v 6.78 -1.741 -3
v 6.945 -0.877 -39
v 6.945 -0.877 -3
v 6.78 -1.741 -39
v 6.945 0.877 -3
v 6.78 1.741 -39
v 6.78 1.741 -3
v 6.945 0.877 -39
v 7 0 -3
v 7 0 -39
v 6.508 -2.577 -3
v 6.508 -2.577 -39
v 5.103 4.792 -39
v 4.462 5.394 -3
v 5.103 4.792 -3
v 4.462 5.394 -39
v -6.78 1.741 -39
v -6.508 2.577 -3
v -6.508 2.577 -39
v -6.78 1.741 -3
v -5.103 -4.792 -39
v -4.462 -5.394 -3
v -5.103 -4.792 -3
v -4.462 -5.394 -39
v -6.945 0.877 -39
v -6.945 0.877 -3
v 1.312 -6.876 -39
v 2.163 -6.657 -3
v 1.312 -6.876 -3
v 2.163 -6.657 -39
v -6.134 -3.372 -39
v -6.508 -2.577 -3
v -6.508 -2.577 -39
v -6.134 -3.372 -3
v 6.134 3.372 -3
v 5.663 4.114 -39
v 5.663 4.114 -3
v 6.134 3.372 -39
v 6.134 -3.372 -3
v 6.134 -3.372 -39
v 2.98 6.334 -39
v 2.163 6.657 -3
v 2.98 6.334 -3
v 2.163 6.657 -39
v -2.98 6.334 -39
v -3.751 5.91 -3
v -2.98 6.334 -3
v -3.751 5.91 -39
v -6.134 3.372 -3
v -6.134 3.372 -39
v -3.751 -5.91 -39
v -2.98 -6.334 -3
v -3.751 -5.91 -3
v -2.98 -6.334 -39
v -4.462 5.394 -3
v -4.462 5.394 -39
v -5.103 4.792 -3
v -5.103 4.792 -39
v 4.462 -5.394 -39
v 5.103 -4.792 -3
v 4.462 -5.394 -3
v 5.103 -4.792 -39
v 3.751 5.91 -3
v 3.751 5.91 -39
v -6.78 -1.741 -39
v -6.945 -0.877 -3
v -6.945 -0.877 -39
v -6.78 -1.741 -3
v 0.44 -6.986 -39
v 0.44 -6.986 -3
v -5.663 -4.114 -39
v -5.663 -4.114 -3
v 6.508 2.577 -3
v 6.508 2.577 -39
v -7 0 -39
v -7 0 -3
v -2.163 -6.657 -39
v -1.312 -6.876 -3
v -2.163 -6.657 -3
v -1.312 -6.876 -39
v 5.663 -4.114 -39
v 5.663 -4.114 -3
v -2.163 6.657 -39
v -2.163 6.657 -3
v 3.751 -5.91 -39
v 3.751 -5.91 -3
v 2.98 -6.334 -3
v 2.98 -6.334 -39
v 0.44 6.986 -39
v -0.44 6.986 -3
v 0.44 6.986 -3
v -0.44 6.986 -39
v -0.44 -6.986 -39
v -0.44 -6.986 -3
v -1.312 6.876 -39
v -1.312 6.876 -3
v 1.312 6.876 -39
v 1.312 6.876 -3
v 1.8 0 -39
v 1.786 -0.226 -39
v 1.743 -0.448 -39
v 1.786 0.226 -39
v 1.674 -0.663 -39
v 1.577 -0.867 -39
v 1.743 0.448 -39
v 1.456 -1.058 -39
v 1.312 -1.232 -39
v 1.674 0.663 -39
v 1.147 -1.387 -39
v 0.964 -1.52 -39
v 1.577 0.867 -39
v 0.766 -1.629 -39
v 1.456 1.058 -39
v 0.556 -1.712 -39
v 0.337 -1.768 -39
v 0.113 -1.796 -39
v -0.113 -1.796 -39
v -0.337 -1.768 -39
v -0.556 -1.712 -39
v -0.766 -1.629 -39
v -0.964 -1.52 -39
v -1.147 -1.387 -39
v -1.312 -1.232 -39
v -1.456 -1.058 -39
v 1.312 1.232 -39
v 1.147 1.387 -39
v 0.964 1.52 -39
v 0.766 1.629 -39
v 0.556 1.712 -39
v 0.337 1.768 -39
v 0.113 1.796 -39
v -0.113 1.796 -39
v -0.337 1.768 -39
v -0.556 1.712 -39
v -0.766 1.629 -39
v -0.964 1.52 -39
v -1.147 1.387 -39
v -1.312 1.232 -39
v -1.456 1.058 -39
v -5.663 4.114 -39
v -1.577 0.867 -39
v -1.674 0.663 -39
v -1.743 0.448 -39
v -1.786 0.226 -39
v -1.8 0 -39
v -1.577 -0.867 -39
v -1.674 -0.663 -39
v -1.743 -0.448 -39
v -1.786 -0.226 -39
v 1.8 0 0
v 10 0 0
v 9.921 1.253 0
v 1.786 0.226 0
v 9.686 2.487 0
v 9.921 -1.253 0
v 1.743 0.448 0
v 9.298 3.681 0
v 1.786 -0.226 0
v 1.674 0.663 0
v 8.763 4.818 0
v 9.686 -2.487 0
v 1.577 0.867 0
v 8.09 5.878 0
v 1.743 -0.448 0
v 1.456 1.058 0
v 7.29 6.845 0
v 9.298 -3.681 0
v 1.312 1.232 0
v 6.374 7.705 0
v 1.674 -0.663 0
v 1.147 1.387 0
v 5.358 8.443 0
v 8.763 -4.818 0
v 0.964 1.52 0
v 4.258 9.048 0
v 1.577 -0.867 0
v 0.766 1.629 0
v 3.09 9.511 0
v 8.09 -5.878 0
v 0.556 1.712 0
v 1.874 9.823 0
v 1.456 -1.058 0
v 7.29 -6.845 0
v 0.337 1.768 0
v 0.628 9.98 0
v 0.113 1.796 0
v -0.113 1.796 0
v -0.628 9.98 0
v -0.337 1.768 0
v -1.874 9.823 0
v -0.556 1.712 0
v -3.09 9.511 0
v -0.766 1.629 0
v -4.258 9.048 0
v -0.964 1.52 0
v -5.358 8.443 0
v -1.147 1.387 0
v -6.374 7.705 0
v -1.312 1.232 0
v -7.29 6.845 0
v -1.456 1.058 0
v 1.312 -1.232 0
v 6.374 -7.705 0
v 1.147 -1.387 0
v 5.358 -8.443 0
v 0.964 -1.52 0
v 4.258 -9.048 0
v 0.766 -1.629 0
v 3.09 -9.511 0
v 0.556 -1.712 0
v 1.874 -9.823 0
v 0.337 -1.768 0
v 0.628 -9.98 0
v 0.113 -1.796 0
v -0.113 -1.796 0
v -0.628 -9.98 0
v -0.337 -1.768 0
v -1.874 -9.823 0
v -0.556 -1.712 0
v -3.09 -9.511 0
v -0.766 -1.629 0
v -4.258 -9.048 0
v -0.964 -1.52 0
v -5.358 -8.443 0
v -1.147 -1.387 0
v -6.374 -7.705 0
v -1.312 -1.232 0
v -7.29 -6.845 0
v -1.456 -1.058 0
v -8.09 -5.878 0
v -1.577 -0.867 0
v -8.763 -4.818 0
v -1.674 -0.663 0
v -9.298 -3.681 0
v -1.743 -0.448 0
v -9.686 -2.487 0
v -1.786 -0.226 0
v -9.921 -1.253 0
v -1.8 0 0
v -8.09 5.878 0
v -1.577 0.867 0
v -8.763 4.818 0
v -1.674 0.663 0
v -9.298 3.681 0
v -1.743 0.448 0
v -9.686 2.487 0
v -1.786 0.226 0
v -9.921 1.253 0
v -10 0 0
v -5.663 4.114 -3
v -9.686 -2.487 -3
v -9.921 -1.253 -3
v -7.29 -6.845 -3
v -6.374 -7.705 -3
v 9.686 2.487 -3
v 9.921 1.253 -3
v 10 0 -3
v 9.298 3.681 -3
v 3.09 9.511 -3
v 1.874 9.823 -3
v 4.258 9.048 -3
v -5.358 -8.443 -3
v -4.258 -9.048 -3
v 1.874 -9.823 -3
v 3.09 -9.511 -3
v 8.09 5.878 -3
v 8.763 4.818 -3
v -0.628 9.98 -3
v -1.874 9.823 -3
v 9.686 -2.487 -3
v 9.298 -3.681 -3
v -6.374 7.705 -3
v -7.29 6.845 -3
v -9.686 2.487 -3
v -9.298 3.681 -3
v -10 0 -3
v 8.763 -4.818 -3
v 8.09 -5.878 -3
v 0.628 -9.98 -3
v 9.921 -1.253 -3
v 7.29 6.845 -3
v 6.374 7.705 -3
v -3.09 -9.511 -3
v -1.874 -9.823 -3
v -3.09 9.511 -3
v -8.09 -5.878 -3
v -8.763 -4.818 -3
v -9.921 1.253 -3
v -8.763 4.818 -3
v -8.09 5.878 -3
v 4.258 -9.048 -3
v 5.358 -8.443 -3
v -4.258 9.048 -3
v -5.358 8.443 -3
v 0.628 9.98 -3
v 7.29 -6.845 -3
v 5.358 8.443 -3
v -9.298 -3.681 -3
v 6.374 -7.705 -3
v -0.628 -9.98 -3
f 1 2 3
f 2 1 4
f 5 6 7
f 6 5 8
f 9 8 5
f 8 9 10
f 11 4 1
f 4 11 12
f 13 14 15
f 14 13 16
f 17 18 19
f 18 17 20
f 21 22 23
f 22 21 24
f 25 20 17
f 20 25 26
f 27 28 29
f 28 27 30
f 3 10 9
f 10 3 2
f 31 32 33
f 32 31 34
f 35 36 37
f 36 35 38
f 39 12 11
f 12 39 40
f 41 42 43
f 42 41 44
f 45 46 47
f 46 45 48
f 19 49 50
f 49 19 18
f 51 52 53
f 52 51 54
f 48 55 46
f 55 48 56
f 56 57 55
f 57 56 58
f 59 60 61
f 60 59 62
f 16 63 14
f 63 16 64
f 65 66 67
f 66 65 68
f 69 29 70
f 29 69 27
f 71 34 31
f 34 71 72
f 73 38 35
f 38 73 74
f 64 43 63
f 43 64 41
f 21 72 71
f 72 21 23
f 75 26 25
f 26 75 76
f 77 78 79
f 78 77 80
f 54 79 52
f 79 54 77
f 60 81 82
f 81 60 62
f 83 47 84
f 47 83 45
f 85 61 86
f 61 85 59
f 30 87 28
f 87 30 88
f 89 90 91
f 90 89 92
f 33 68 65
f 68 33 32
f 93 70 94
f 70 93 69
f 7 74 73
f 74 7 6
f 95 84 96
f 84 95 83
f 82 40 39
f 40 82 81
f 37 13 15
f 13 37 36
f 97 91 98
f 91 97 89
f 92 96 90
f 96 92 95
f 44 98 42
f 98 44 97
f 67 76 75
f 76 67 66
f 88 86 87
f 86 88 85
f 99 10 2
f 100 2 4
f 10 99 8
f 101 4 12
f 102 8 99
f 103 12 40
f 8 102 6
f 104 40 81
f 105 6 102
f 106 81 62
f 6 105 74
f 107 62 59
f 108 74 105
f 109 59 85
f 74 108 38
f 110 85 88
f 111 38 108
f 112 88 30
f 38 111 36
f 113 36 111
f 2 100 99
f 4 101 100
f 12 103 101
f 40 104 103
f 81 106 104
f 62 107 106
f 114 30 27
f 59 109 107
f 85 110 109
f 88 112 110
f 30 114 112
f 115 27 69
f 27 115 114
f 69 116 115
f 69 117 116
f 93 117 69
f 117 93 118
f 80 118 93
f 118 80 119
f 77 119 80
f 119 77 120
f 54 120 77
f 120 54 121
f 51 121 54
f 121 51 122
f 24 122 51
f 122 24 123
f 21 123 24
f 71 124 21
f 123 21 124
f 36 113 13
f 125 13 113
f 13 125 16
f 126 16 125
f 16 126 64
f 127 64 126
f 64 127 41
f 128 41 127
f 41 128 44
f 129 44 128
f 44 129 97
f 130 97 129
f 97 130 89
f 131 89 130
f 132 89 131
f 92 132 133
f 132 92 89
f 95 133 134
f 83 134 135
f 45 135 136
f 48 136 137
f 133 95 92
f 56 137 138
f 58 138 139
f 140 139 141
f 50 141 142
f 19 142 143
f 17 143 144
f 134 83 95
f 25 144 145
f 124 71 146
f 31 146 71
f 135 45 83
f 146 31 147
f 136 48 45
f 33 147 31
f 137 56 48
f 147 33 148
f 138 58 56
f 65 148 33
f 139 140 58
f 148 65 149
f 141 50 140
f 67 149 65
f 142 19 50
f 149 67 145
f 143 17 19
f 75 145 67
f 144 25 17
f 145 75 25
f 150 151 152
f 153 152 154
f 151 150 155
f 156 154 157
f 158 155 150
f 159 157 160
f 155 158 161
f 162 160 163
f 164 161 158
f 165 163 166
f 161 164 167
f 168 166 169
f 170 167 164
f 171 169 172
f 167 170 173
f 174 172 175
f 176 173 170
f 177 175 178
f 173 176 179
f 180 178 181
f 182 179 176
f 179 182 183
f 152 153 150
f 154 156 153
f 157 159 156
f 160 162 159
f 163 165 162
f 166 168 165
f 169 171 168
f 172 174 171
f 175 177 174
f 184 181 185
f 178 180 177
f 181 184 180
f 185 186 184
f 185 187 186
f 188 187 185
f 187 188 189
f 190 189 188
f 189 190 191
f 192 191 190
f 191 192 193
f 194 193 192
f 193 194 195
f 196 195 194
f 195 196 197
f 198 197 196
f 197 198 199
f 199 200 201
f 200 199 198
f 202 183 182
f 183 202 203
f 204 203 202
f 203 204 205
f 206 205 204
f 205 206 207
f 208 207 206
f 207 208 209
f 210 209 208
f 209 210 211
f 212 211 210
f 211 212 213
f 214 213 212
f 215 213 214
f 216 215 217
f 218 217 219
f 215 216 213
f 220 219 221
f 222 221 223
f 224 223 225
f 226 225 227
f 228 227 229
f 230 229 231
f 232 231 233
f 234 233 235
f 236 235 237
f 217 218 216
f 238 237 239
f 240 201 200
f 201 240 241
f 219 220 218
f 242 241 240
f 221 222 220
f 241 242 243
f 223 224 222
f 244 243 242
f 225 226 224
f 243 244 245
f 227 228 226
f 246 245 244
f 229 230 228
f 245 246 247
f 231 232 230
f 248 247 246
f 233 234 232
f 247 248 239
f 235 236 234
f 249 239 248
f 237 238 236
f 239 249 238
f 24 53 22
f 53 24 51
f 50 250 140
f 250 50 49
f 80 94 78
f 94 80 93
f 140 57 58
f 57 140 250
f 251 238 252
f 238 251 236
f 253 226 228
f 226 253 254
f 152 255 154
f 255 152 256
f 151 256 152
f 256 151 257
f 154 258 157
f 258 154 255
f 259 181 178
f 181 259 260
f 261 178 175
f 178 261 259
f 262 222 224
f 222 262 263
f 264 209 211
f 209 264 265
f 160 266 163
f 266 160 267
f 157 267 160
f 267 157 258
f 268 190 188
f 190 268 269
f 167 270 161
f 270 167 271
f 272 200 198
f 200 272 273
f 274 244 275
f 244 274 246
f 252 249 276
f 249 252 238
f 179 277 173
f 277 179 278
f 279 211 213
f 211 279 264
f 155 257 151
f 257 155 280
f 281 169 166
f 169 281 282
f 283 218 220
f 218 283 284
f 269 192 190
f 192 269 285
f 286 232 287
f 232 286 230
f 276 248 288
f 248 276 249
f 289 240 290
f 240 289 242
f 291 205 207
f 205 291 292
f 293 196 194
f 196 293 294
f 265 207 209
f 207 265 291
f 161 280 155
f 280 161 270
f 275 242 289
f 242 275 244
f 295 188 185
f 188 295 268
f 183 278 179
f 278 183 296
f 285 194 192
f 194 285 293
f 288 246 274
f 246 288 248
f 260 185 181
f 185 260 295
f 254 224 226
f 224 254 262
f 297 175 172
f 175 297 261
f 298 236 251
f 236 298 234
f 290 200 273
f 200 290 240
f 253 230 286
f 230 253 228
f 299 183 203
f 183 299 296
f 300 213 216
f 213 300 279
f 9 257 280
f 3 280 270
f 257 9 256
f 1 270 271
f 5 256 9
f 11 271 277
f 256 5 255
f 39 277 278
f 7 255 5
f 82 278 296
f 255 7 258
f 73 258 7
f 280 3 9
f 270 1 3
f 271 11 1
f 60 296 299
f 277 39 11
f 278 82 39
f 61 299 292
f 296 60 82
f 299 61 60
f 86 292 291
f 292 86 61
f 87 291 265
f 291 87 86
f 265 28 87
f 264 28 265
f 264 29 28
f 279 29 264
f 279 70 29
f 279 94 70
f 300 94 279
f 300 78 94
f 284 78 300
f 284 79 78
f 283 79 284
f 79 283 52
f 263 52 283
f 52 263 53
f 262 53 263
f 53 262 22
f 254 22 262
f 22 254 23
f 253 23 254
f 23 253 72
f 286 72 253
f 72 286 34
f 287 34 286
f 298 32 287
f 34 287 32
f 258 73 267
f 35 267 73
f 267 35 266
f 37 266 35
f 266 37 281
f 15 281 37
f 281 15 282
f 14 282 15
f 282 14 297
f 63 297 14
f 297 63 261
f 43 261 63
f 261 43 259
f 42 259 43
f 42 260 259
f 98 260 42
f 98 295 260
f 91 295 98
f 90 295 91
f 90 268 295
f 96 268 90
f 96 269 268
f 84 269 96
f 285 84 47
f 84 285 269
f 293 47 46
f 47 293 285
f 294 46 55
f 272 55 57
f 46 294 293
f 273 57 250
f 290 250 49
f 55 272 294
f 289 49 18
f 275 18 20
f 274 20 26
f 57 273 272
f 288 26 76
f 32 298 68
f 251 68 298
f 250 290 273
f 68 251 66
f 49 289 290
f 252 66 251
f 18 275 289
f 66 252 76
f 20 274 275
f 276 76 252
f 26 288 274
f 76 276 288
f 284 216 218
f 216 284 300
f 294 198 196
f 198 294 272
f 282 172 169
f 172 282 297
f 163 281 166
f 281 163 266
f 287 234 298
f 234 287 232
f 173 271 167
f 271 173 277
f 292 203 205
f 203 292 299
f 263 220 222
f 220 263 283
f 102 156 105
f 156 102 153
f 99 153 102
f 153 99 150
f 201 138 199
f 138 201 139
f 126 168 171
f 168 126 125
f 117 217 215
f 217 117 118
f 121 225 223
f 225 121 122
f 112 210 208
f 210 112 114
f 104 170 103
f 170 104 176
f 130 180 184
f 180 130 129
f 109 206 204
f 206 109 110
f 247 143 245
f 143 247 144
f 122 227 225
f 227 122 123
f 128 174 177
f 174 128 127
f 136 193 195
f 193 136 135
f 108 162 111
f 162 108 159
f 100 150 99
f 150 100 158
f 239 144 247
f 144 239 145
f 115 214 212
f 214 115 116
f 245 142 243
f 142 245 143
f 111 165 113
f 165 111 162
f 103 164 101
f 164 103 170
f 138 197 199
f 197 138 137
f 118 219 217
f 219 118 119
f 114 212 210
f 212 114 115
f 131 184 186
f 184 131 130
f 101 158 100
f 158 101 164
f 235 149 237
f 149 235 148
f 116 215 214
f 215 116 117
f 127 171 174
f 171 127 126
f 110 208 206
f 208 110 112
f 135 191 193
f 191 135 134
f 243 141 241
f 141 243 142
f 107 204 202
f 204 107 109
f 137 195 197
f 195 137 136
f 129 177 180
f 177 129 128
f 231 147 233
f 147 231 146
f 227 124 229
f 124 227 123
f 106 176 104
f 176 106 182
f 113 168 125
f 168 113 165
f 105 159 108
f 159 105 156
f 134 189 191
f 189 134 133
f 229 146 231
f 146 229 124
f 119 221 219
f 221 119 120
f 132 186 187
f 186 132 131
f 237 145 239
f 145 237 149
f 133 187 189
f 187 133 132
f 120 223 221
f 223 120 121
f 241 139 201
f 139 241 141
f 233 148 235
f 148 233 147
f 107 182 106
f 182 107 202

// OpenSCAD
$fn = 50;


difference() {
	union() {
		translate(v = [0, 0, -39.0000000000]) {
			cylinder(h = 39, r = 7.0000000000);
		}
		translate(v = [0, 0, -3.0000000000]) {
			cylinder(h = 3, r = 10.0000000000);
		}
	}
	union() {
		#translate(v = [0, 0, -39]) {
			cylinder(h = 39, r = 1.8000000000);
		}
	}
}
